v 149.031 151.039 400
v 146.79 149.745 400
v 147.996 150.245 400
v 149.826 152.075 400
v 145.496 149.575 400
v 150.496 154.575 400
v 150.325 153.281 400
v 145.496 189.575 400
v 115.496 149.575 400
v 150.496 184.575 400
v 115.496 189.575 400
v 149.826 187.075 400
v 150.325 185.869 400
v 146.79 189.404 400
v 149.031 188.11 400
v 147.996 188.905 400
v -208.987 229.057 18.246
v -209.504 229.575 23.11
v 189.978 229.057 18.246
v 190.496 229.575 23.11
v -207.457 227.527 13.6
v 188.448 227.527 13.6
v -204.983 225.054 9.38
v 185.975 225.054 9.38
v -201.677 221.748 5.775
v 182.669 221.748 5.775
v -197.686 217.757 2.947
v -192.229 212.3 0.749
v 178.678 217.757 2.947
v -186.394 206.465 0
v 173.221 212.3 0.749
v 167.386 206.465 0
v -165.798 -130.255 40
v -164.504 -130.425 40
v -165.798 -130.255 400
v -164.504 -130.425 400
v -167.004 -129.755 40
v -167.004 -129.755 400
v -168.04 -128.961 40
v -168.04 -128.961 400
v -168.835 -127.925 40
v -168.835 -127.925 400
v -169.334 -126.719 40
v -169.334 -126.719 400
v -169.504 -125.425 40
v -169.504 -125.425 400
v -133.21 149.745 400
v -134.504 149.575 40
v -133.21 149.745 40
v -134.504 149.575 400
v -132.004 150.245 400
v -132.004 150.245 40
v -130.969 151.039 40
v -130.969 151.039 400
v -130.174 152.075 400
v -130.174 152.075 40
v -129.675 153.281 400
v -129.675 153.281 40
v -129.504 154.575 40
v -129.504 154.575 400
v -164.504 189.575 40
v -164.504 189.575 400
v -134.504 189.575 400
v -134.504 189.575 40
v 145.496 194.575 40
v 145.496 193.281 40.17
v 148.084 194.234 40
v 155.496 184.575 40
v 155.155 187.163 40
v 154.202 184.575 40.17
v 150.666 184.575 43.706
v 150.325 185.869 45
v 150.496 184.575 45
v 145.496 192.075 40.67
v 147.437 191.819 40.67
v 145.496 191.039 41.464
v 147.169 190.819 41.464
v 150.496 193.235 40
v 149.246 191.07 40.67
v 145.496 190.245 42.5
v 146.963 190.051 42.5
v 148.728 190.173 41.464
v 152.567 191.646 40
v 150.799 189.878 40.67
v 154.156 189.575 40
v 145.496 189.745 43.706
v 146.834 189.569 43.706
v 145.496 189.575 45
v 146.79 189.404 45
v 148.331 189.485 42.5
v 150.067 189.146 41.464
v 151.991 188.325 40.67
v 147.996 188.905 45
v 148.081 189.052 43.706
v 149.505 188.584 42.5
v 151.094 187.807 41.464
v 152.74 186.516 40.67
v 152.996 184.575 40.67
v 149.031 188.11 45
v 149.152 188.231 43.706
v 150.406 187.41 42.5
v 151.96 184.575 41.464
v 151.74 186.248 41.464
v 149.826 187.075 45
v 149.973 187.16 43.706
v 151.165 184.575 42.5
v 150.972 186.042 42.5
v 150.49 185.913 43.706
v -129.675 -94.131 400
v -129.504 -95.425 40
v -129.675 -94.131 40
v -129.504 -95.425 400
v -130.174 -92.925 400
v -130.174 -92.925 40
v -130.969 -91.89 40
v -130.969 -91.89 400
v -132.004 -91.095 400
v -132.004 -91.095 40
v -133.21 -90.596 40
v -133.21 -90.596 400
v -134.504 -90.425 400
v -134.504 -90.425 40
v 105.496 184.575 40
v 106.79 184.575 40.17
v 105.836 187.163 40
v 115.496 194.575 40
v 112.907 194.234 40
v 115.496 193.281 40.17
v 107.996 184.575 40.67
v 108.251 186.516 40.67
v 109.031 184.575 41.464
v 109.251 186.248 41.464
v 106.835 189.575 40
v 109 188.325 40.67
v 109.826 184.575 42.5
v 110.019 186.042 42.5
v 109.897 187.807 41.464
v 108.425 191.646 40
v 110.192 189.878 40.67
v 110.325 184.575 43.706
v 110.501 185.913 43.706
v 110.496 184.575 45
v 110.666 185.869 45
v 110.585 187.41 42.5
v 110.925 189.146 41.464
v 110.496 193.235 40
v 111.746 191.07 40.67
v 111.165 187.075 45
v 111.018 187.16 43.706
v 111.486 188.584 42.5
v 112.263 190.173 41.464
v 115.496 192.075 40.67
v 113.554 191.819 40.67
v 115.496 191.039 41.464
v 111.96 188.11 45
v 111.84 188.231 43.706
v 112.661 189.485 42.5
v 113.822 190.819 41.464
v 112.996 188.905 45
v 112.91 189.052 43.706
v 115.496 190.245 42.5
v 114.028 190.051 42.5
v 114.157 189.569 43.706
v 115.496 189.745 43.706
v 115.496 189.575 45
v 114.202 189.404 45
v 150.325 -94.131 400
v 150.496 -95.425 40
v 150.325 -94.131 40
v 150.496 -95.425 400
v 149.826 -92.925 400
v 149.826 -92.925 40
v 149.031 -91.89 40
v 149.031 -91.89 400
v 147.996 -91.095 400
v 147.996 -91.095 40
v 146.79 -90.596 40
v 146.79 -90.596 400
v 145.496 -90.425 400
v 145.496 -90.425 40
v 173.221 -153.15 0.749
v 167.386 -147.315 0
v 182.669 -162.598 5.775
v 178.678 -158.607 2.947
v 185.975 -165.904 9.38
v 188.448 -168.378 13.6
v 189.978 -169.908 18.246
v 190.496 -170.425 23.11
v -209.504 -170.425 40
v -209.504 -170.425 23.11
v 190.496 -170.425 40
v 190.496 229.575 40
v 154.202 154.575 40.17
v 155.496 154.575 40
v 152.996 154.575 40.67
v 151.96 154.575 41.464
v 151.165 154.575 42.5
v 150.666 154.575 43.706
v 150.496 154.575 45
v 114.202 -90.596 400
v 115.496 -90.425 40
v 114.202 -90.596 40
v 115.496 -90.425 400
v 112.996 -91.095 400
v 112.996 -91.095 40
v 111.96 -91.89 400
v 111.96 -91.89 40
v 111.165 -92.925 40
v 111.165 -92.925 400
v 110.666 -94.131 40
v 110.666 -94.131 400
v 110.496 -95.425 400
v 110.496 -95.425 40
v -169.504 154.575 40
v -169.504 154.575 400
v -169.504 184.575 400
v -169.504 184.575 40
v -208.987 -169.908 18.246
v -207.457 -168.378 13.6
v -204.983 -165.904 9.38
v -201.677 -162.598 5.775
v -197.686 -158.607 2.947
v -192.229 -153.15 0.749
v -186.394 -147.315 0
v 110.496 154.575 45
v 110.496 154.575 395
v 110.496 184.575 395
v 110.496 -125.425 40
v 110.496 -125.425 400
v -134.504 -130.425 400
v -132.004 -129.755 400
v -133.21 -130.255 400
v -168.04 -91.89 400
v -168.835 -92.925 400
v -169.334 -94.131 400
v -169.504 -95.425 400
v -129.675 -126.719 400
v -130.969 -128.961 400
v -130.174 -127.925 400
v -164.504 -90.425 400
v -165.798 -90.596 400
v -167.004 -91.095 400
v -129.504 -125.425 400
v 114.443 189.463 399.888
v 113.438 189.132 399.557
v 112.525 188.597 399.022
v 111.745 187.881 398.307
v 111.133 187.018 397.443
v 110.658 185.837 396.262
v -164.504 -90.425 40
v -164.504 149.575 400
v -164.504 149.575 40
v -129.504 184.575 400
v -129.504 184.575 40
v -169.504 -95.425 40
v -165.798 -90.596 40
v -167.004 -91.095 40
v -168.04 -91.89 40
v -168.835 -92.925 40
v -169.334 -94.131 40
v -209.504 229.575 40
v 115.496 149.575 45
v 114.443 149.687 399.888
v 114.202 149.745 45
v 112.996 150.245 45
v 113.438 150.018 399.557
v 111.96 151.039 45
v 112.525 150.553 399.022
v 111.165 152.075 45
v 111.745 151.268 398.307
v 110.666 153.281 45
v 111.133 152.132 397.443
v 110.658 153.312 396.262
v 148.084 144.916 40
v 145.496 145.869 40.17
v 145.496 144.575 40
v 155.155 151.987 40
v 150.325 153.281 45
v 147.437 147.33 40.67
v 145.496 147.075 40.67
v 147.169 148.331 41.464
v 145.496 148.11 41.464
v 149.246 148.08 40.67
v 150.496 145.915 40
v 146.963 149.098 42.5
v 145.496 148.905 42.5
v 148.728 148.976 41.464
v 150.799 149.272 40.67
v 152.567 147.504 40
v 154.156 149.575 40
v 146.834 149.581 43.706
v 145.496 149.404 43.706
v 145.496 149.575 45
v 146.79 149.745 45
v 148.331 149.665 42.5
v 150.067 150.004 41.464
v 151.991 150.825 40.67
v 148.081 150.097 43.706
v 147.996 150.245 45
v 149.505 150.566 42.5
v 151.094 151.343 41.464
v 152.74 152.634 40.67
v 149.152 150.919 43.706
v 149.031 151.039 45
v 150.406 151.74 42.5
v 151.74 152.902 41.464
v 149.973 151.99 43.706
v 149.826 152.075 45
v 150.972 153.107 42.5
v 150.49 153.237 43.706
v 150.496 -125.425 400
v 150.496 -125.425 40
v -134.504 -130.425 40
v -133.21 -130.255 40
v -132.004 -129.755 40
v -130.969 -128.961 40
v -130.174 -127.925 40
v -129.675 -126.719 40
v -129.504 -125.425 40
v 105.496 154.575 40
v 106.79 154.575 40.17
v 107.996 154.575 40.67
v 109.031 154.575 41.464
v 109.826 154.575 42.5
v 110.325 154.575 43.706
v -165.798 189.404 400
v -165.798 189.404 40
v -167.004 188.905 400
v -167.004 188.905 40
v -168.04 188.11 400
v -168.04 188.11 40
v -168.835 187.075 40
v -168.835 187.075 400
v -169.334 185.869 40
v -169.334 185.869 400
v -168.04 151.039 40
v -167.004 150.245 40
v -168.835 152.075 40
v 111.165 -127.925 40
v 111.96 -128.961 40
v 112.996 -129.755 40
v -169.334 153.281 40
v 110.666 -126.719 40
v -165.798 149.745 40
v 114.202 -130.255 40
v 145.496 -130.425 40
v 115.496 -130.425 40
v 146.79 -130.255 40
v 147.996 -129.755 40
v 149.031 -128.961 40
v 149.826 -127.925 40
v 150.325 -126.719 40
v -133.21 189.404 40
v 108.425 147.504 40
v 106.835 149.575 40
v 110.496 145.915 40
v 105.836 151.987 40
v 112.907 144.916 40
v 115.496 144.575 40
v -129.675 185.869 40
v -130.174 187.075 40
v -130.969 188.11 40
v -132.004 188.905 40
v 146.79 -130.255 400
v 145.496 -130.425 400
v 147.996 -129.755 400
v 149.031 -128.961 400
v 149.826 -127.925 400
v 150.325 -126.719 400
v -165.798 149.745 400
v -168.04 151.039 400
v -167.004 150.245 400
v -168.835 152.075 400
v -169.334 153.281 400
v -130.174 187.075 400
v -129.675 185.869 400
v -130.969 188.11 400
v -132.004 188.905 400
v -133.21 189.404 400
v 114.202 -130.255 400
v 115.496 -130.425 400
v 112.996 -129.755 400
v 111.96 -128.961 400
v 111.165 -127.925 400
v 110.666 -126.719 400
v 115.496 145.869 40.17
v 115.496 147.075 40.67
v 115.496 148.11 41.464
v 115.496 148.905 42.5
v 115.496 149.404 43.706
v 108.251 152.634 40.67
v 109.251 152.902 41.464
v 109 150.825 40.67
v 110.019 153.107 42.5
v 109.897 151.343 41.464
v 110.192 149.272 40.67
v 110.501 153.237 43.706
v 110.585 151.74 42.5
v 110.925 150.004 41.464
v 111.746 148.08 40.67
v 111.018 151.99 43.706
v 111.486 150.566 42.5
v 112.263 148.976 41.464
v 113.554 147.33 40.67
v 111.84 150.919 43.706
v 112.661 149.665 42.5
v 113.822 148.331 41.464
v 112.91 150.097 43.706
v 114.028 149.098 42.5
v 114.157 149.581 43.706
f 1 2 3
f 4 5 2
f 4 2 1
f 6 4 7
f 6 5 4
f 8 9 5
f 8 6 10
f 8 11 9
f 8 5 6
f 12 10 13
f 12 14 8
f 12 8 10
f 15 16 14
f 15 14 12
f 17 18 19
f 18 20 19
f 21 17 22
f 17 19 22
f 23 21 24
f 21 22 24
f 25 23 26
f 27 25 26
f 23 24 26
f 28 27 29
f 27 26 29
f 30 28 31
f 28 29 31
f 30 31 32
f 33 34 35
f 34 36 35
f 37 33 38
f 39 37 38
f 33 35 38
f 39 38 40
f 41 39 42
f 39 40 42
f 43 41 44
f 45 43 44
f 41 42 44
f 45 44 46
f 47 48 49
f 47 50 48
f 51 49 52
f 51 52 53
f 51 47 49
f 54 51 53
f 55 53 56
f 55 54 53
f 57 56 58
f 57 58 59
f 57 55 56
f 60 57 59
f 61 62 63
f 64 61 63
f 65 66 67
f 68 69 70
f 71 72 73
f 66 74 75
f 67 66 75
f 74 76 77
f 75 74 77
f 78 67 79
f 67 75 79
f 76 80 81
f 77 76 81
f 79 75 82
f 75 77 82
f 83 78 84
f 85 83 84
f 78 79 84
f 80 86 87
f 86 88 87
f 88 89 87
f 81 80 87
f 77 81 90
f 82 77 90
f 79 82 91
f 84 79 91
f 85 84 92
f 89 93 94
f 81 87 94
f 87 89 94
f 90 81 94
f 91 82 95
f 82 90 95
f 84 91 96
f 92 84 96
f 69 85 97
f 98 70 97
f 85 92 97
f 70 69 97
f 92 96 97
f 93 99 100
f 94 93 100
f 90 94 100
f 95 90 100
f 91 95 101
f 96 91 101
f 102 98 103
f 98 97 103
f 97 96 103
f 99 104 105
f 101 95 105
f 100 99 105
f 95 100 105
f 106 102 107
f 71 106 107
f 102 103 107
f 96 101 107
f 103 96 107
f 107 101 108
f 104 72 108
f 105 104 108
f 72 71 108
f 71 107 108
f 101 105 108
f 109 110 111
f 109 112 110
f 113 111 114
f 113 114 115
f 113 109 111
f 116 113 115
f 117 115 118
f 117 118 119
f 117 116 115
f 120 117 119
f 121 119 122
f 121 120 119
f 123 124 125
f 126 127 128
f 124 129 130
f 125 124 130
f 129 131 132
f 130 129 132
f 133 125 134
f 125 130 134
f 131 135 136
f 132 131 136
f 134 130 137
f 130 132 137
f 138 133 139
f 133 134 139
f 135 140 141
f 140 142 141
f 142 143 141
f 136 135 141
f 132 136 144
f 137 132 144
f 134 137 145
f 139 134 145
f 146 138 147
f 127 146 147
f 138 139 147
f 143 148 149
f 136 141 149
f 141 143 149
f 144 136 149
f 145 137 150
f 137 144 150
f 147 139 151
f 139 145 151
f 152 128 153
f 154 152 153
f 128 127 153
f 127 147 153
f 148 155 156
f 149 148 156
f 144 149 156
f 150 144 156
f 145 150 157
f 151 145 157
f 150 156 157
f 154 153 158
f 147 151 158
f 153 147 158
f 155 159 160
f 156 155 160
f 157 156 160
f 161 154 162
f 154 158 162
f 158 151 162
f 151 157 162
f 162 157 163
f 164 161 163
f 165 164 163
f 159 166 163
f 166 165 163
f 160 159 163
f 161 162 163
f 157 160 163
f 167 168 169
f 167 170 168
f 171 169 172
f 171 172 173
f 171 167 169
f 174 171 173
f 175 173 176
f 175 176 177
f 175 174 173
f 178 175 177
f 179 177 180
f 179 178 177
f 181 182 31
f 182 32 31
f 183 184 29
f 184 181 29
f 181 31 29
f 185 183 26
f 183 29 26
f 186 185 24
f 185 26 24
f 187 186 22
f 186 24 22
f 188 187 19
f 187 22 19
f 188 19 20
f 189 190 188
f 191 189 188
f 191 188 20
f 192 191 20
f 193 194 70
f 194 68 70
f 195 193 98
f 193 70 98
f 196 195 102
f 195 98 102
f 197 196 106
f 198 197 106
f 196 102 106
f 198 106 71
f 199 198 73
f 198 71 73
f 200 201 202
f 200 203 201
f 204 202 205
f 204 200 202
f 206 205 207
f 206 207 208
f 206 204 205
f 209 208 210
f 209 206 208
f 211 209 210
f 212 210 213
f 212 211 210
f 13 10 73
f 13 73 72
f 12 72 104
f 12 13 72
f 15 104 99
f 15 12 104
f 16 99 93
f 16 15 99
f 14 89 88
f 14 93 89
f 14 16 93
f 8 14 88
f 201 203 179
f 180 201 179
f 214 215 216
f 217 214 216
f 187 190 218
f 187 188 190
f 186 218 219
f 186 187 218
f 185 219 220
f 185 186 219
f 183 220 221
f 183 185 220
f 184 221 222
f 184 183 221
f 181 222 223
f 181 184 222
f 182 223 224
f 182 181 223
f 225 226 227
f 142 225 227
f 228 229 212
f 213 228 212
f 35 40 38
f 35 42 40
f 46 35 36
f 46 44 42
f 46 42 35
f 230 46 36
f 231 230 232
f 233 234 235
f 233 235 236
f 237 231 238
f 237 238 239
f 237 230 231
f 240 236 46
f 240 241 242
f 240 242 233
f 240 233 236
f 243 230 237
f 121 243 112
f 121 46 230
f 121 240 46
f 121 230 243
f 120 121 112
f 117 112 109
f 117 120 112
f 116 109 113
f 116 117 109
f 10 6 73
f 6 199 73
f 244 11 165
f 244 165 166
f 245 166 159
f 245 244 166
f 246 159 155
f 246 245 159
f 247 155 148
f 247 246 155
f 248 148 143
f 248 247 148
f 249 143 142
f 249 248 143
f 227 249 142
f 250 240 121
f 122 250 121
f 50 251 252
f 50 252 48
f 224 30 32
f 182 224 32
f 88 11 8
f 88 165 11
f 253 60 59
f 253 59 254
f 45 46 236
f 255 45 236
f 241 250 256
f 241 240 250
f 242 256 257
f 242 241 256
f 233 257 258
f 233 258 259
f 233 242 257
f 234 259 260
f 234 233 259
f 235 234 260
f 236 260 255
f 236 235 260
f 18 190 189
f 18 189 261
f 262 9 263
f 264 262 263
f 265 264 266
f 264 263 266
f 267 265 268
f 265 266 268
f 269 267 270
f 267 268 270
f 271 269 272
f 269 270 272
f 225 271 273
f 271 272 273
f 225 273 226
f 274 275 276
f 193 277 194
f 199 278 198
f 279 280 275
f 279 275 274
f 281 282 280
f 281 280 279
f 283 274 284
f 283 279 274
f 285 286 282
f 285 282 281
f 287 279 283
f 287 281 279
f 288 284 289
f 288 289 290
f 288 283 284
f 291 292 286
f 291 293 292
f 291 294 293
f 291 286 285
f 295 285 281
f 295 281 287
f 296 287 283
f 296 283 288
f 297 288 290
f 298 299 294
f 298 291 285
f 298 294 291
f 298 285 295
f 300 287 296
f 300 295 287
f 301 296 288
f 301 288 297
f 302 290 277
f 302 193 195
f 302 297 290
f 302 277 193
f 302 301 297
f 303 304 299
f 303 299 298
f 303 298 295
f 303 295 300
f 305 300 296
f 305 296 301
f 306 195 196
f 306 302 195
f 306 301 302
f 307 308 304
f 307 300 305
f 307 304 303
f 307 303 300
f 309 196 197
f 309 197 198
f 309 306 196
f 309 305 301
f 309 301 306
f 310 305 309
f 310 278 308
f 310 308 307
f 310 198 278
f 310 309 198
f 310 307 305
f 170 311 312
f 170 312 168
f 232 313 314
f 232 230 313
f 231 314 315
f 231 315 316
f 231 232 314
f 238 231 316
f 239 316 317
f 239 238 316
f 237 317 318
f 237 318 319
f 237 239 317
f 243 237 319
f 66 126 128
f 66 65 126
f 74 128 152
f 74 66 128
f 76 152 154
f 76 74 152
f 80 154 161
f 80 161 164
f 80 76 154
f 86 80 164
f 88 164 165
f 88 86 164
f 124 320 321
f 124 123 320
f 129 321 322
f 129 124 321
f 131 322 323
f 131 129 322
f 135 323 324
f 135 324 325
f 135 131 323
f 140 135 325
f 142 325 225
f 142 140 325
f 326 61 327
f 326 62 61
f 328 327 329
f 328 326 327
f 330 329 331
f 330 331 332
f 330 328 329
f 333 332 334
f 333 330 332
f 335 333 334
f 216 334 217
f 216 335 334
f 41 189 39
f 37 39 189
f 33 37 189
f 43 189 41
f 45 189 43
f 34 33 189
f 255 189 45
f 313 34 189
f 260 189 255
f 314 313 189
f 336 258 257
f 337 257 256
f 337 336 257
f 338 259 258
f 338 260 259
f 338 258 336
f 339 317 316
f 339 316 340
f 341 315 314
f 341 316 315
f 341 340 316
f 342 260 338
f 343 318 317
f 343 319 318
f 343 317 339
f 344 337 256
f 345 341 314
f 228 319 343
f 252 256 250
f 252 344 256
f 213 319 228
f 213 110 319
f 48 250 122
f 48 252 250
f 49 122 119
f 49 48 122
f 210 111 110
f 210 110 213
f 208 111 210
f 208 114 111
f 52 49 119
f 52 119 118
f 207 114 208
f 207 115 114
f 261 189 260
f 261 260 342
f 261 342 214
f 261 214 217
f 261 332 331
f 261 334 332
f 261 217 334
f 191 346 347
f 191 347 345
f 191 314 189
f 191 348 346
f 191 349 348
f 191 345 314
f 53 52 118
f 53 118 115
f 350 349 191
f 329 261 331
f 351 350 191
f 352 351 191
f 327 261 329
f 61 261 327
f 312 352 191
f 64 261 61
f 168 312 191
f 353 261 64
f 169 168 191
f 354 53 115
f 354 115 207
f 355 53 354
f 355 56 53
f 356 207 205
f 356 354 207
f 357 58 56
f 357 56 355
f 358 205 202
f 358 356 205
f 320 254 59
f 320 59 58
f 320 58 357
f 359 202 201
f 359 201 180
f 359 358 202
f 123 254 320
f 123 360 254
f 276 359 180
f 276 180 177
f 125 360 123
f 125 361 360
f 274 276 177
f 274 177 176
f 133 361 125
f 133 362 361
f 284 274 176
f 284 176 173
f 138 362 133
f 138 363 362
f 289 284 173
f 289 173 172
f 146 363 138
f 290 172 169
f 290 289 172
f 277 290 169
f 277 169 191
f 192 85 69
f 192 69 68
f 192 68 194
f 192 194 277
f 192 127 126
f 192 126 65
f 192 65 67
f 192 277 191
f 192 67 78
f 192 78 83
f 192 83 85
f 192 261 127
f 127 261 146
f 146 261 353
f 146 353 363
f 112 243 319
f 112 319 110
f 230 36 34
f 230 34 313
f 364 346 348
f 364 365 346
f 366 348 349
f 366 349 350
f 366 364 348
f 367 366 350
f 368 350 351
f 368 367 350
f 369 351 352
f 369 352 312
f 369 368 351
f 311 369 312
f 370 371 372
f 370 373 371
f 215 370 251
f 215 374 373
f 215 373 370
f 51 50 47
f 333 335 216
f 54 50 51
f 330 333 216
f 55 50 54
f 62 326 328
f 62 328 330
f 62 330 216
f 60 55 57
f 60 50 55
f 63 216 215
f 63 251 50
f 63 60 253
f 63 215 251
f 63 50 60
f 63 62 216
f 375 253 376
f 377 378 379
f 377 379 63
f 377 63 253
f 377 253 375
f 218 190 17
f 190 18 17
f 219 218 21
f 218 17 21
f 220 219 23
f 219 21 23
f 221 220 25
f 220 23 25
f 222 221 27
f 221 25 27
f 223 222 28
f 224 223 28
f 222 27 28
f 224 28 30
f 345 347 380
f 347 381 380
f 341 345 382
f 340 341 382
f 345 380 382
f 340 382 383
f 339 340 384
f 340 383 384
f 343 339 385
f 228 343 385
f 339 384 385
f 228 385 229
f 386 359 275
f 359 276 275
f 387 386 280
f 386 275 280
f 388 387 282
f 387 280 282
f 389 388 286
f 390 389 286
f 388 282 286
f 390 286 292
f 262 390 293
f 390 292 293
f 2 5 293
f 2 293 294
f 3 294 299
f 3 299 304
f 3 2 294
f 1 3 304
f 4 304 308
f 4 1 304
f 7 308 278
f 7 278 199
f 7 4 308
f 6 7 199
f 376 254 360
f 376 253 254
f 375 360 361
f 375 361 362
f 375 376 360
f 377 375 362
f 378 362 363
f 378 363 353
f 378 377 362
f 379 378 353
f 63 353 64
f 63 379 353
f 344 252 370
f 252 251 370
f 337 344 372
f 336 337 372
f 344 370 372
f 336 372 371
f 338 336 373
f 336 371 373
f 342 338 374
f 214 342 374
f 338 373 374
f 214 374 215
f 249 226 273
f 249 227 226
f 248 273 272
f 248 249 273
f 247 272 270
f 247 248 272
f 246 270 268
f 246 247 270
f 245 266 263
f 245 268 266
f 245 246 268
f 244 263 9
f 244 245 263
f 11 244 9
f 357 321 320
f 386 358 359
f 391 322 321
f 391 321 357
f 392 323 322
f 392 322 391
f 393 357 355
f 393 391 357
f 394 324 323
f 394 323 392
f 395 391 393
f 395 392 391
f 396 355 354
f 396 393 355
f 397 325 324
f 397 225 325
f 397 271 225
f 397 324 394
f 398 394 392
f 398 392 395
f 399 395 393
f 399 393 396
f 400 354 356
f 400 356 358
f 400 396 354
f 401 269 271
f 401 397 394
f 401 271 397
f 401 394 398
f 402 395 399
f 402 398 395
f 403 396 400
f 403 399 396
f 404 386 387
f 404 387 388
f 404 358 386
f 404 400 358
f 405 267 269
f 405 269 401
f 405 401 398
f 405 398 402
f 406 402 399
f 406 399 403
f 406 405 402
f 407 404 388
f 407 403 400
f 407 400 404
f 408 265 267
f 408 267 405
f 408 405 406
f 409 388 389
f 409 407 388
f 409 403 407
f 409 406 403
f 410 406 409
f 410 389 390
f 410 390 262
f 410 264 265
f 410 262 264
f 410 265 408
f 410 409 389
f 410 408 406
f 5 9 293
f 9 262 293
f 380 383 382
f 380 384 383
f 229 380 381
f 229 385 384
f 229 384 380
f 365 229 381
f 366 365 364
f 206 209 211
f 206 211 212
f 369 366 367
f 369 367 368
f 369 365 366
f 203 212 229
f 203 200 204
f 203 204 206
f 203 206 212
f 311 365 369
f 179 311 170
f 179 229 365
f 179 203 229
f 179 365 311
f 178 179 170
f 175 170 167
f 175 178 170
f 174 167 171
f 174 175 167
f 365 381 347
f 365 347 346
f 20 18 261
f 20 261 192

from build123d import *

# Parameters (mm, degrees)
F0_W     = 400
F0_H     = 400
F1_DEPTH = 40
F2_W     = 40
F2_H     = 40
F3_DEPTH = 360
F4_R     = 23.11
F5_R     = 5
F6_R     = 5


with BuildPart() as f1:
    # F0 (on Top) → F1 (new body)
    with BuildSketch(Plane.XY):
        with Locations((-9.5043759793, 29.5748232458)):
            Rectangle(F0_W, F0_H)
    extrude(amount=F1_DEPTH)

    # F2 (on face) → F3 (join)
    with BuildSketch(Plane.XY.offset(40)):
        with Locations((130.4956240207, -110.4251767542)):
            Rectangle(F2_W, F2_H)
        with Locations((-149.5043759793, -110.4251767542)):
            Rectangle(F2_W, F2_H)
        with Locations((-149.5043759793, 169.5748232458)):
            Rectangle(F2_W, F2_H)
        with Locations((130.4956240207, 169.5748232458)):
            Rectangle(F2_W, F2_H)
    extrude(amount=F3_DEPTH)

    # F4
    f4_edges = [f1.edges().sort_by_distance(p)[0] for p in [
        (-209.504376, 29.574823, 0),
        (-9.504376, 229.574823, 0),
        (-9.504376, -170.425177, 0),
        (190.495624, 29.574823, 0),
    ]]
    fillet(f4_edges, radius=F4_R)

    # F5
    f5_edges = [f1.edges().sort_by_distance(p)[0] for p in [
        (-129.504376, 189.574823, 220),
        (-129.504376, 149.574823, 220),
        (-169.504376, -130.425177, 220),
        (-129.504376, -130.425177, 220),
        (-129.504376, -90.425177, 220),
        (-169.504376, -90.425177, 220),
        (-169.504376, 189.574823, 220),
        (-169.504376, 149.574823, 220),
    ]]
    fillet(f5_edges, radius=F5_R)

    # F6
    f6_edges = [f1.edges().sort_by_distance(p)[0] for p in [
        (150.495624, -130.425177, 220),
        (150.495624, -90.425177, 220),
        (150.495624, 149.574823, 220),
        (150.495624, 189.574823, 220),
        (110.495624, 189.574823, 220),
        (110.495624, 149.574823, 220),
        (110.495624, 169.574823, 40),
        (110.495624, 169.574823, 400),
        (110.495624, -90.425177, 220),
        (110.495624, -130.425177, 220),
        (130.495624, 189.574823, 40),
        (130.495624, 149.574823, 40),
        (150.495624, 169.574823, 40),
    ]]
    fillet(f6_edges, radius=F6_R)


solid = f1.part
